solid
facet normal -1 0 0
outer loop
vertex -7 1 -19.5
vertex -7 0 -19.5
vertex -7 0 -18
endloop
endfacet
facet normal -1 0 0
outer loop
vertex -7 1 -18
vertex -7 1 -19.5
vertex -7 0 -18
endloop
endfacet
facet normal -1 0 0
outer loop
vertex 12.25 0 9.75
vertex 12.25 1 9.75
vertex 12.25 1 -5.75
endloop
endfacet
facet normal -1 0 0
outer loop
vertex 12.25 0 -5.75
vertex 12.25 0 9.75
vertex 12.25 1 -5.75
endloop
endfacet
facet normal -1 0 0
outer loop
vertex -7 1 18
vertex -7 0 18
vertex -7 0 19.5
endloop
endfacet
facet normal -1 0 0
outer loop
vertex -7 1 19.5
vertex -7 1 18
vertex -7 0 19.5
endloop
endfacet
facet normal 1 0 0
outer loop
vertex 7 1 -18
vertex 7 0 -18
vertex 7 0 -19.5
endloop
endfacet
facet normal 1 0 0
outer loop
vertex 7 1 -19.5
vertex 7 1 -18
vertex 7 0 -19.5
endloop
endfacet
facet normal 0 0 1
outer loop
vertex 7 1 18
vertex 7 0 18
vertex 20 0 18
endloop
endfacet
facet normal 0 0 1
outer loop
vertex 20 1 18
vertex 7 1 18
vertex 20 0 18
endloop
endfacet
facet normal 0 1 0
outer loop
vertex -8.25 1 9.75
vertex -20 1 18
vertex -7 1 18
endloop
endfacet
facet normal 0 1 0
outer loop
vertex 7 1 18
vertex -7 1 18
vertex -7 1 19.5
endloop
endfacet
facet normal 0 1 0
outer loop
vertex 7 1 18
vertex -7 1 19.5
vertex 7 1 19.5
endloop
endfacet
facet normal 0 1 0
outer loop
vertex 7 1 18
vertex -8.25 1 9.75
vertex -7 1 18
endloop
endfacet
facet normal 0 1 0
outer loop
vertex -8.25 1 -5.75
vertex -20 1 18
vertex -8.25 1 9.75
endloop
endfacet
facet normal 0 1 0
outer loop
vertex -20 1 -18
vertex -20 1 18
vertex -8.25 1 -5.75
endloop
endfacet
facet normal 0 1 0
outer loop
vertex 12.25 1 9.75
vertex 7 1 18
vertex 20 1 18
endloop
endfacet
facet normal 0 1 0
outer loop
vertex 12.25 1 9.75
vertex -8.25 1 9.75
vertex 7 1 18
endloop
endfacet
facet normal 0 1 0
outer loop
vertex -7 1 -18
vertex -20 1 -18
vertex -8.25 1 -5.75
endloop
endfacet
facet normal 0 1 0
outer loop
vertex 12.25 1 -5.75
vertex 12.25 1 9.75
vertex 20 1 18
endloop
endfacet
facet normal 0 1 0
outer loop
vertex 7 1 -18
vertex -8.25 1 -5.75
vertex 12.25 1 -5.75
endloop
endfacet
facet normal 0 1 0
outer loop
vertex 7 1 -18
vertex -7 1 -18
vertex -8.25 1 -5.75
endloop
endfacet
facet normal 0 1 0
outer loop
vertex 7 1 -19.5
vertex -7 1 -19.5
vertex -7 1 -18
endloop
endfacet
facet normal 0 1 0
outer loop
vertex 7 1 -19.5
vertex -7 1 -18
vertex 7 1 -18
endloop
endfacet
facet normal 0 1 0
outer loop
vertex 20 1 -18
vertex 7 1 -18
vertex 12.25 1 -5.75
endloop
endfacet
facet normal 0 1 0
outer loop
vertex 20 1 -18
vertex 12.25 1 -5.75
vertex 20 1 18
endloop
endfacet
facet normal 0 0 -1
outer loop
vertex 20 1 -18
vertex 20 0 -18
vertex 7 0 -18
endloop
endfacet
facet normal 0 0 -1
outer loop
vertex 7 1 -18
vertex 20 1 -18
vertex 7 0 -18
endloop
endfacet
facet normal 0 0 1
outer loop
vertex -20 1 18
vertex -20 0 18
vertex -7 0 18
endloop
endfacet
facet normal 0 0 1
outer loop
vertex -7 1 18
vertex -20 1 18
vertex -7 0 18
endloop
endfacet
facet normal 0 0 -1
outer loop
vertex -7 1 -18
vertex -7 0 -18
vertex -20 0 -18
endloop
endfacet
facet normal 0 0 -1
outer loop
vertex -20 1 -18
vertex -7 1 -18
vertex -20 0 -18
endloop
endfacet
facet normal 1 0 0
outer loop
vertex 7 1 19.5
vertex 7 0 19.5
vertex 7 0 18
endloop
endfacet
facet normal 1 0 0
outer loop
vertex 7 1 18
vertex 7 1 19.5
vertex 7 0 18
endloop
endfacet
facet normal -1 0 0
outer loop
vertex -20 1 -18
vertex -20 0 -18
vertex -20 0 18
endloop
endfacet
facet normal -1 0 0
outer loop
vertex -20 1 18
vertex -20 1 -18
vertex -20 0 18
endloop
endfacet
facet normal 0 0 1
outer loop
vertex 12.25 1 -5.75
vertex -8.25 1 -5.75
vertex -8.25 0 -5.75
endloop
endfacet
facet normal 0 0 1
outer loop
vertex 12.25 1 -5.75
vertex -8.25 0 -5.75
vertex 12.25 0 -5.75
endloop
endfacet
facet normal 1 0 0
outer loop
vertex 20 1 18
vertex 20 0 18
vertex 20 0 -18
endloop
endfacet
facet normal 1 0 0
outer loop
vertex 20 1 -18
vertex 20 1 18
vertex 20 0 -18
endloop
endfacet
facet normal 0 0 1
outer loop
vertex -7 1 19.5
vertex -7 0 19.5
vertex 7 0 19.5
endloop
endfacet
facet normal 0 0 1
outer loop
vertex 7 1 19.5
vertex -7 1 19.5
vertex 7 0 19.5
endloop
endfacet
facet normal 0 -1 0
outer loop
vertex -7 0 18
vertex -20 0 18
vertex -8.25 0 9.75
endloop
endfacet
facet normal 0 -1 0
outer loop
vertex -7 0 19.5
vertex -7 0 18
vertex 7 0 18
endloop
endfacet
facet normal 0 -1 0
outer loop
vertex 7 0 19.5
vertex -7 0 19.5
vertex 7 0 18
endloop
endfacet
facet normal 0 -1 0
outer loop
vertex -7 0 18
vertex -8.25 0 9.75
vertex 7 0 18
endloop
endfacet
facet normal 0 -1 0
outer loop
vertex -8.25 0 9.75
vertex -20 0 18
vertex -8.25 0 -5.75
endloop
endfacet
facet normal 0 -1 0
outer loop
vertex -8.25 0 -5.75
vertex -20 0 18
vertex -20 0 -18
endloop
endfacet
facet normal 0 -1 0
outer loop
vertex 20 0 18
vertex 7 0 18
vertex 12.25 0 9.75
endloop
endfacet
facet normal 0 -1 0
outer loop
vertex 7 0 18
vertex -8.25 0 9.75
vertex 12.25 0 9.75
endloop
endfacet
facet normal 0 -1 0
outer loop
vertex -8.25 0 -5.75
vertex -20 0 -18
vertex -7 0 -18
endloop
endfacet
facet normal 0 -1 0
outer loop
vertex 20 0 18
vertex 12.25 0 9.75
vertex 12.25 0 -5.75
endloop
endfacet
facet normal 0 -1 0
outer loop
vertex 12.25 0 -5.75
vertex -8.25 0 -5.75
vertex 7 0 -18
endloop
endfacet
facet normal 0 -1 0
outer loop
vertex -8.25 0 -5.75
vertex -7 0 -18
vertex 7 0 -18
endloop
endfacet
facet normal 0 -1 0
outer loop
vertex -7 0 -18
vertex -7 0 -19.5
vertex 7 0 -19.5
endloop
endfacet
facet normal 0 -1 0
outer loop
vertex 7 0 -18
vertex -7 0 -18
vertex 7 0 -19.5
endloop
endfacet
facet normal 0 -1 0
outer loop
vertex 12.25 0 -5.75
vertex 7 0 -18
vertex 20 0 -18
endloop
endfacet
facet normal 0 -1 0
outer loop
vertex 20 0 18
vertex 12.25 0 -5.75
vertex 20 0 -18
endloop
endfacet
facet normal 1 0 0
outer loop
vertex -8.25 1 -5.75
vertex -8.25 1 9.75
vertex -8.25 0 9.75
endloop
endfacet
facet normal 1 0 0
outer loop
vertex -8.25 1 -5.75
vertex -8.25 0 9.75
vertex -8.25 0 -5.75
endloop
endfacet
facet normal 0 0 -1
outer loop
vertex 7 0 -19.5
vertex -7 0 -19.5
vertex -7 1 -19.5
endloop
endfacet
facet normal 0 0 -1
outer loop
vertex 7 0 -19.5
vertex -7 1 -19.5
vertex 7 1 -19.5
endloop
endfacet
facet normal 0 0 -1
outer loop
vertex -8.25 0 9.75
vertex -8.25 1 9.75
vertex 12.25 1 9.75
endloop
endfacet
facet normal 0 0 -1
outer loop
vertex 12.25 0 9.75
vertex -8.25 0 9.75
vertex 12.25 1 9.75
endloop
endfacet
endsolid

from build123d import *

# Parameters (mm, degrees)
SKETCH_1_W         = 43
SKETCH_1_H         = 39
TOP_DEPTH          = 1
DHT22_WINDOW_REACH = 31.043
SKETCH_2_W         = 20.5
SKETCH_2_H         = 15.5
EAR_REACH          = 31.043


with BuildPart() as part:
    # 스케치1 → Top (new body)
    with BuildSketch(Plane(origin=(0, 0, 0), x_dir=(1, 0, 0), z_dir=(0, 1, 0))):
        Rectangle(SKETCH_1_W, SKETCH_1_H)
    extrude(amount=TOP_DEPTH)

    # 스케치2 → DHT22_window (cut, up to next)
    with BuildSketch(Plane(origin=(0, 1, 0), x_dir=(1, 0, 0), z_dir=(0, 1, 0)), mode=Mode.PRIVATE) as dht22_window_sk1:
        with Locations((2, -2)):
            Rectangle(SKETCH_2_W, SKETCH_2_H)
    dht22_window_tool1 = extrude(dht22_window_sk1.sketch, amount=-DHT22_WINDOW_REACH, mode=Mode.PRIVATE) & part.part
    add(dht22_window_tool1.solids().sort_by_distance((2, 1, 2))[0], mode=Mode.SUBTRACT)

    # 스케치3 → Ear (cut, up to next)
    with BuildSketch(Plane.XZ, mode=Mode.PRIVATE) as ear_sk1:
        Polygon((-20, -18), (-20, 18), (-7, 18), (-7, 19.5), (-21.5, 19.5), (-21.5, -19.5), (-7, -19.5), (-7, -18), align=None)
    ear_tool1 = extrude(ear_sk1.sketch, amount=-EAR_REACH, mode=Mode.PRIVATE) & part.part
    # 스케치3 → Ear (cut, up to next)
    with BuildSketch(Plane.XZ, mode=Mode.PRIVATE) as ear_sk2:
        Polygon((7, 19.5), (7, 18), (20, 18), (20, -18), (7, -18), (7, -19.5), (21.5, -19.5), (21.5, 19.5), align=None)
    ear_tool2 = extrude(ear_sk2.sketch, amount=-EAR_REACH, mode=Mode.PRIVATE) & part.part
    add(ear_tool1.solids().sort_by_distance((-7.416083, 0, -18.75))[0], mode=Mode.SUBTRACT)
    add(ear_tool2.solids().sort_by_distance((7.416083, 0, 18.75))[0], mode=Mode.SUBTRACT)


solid = part.part
